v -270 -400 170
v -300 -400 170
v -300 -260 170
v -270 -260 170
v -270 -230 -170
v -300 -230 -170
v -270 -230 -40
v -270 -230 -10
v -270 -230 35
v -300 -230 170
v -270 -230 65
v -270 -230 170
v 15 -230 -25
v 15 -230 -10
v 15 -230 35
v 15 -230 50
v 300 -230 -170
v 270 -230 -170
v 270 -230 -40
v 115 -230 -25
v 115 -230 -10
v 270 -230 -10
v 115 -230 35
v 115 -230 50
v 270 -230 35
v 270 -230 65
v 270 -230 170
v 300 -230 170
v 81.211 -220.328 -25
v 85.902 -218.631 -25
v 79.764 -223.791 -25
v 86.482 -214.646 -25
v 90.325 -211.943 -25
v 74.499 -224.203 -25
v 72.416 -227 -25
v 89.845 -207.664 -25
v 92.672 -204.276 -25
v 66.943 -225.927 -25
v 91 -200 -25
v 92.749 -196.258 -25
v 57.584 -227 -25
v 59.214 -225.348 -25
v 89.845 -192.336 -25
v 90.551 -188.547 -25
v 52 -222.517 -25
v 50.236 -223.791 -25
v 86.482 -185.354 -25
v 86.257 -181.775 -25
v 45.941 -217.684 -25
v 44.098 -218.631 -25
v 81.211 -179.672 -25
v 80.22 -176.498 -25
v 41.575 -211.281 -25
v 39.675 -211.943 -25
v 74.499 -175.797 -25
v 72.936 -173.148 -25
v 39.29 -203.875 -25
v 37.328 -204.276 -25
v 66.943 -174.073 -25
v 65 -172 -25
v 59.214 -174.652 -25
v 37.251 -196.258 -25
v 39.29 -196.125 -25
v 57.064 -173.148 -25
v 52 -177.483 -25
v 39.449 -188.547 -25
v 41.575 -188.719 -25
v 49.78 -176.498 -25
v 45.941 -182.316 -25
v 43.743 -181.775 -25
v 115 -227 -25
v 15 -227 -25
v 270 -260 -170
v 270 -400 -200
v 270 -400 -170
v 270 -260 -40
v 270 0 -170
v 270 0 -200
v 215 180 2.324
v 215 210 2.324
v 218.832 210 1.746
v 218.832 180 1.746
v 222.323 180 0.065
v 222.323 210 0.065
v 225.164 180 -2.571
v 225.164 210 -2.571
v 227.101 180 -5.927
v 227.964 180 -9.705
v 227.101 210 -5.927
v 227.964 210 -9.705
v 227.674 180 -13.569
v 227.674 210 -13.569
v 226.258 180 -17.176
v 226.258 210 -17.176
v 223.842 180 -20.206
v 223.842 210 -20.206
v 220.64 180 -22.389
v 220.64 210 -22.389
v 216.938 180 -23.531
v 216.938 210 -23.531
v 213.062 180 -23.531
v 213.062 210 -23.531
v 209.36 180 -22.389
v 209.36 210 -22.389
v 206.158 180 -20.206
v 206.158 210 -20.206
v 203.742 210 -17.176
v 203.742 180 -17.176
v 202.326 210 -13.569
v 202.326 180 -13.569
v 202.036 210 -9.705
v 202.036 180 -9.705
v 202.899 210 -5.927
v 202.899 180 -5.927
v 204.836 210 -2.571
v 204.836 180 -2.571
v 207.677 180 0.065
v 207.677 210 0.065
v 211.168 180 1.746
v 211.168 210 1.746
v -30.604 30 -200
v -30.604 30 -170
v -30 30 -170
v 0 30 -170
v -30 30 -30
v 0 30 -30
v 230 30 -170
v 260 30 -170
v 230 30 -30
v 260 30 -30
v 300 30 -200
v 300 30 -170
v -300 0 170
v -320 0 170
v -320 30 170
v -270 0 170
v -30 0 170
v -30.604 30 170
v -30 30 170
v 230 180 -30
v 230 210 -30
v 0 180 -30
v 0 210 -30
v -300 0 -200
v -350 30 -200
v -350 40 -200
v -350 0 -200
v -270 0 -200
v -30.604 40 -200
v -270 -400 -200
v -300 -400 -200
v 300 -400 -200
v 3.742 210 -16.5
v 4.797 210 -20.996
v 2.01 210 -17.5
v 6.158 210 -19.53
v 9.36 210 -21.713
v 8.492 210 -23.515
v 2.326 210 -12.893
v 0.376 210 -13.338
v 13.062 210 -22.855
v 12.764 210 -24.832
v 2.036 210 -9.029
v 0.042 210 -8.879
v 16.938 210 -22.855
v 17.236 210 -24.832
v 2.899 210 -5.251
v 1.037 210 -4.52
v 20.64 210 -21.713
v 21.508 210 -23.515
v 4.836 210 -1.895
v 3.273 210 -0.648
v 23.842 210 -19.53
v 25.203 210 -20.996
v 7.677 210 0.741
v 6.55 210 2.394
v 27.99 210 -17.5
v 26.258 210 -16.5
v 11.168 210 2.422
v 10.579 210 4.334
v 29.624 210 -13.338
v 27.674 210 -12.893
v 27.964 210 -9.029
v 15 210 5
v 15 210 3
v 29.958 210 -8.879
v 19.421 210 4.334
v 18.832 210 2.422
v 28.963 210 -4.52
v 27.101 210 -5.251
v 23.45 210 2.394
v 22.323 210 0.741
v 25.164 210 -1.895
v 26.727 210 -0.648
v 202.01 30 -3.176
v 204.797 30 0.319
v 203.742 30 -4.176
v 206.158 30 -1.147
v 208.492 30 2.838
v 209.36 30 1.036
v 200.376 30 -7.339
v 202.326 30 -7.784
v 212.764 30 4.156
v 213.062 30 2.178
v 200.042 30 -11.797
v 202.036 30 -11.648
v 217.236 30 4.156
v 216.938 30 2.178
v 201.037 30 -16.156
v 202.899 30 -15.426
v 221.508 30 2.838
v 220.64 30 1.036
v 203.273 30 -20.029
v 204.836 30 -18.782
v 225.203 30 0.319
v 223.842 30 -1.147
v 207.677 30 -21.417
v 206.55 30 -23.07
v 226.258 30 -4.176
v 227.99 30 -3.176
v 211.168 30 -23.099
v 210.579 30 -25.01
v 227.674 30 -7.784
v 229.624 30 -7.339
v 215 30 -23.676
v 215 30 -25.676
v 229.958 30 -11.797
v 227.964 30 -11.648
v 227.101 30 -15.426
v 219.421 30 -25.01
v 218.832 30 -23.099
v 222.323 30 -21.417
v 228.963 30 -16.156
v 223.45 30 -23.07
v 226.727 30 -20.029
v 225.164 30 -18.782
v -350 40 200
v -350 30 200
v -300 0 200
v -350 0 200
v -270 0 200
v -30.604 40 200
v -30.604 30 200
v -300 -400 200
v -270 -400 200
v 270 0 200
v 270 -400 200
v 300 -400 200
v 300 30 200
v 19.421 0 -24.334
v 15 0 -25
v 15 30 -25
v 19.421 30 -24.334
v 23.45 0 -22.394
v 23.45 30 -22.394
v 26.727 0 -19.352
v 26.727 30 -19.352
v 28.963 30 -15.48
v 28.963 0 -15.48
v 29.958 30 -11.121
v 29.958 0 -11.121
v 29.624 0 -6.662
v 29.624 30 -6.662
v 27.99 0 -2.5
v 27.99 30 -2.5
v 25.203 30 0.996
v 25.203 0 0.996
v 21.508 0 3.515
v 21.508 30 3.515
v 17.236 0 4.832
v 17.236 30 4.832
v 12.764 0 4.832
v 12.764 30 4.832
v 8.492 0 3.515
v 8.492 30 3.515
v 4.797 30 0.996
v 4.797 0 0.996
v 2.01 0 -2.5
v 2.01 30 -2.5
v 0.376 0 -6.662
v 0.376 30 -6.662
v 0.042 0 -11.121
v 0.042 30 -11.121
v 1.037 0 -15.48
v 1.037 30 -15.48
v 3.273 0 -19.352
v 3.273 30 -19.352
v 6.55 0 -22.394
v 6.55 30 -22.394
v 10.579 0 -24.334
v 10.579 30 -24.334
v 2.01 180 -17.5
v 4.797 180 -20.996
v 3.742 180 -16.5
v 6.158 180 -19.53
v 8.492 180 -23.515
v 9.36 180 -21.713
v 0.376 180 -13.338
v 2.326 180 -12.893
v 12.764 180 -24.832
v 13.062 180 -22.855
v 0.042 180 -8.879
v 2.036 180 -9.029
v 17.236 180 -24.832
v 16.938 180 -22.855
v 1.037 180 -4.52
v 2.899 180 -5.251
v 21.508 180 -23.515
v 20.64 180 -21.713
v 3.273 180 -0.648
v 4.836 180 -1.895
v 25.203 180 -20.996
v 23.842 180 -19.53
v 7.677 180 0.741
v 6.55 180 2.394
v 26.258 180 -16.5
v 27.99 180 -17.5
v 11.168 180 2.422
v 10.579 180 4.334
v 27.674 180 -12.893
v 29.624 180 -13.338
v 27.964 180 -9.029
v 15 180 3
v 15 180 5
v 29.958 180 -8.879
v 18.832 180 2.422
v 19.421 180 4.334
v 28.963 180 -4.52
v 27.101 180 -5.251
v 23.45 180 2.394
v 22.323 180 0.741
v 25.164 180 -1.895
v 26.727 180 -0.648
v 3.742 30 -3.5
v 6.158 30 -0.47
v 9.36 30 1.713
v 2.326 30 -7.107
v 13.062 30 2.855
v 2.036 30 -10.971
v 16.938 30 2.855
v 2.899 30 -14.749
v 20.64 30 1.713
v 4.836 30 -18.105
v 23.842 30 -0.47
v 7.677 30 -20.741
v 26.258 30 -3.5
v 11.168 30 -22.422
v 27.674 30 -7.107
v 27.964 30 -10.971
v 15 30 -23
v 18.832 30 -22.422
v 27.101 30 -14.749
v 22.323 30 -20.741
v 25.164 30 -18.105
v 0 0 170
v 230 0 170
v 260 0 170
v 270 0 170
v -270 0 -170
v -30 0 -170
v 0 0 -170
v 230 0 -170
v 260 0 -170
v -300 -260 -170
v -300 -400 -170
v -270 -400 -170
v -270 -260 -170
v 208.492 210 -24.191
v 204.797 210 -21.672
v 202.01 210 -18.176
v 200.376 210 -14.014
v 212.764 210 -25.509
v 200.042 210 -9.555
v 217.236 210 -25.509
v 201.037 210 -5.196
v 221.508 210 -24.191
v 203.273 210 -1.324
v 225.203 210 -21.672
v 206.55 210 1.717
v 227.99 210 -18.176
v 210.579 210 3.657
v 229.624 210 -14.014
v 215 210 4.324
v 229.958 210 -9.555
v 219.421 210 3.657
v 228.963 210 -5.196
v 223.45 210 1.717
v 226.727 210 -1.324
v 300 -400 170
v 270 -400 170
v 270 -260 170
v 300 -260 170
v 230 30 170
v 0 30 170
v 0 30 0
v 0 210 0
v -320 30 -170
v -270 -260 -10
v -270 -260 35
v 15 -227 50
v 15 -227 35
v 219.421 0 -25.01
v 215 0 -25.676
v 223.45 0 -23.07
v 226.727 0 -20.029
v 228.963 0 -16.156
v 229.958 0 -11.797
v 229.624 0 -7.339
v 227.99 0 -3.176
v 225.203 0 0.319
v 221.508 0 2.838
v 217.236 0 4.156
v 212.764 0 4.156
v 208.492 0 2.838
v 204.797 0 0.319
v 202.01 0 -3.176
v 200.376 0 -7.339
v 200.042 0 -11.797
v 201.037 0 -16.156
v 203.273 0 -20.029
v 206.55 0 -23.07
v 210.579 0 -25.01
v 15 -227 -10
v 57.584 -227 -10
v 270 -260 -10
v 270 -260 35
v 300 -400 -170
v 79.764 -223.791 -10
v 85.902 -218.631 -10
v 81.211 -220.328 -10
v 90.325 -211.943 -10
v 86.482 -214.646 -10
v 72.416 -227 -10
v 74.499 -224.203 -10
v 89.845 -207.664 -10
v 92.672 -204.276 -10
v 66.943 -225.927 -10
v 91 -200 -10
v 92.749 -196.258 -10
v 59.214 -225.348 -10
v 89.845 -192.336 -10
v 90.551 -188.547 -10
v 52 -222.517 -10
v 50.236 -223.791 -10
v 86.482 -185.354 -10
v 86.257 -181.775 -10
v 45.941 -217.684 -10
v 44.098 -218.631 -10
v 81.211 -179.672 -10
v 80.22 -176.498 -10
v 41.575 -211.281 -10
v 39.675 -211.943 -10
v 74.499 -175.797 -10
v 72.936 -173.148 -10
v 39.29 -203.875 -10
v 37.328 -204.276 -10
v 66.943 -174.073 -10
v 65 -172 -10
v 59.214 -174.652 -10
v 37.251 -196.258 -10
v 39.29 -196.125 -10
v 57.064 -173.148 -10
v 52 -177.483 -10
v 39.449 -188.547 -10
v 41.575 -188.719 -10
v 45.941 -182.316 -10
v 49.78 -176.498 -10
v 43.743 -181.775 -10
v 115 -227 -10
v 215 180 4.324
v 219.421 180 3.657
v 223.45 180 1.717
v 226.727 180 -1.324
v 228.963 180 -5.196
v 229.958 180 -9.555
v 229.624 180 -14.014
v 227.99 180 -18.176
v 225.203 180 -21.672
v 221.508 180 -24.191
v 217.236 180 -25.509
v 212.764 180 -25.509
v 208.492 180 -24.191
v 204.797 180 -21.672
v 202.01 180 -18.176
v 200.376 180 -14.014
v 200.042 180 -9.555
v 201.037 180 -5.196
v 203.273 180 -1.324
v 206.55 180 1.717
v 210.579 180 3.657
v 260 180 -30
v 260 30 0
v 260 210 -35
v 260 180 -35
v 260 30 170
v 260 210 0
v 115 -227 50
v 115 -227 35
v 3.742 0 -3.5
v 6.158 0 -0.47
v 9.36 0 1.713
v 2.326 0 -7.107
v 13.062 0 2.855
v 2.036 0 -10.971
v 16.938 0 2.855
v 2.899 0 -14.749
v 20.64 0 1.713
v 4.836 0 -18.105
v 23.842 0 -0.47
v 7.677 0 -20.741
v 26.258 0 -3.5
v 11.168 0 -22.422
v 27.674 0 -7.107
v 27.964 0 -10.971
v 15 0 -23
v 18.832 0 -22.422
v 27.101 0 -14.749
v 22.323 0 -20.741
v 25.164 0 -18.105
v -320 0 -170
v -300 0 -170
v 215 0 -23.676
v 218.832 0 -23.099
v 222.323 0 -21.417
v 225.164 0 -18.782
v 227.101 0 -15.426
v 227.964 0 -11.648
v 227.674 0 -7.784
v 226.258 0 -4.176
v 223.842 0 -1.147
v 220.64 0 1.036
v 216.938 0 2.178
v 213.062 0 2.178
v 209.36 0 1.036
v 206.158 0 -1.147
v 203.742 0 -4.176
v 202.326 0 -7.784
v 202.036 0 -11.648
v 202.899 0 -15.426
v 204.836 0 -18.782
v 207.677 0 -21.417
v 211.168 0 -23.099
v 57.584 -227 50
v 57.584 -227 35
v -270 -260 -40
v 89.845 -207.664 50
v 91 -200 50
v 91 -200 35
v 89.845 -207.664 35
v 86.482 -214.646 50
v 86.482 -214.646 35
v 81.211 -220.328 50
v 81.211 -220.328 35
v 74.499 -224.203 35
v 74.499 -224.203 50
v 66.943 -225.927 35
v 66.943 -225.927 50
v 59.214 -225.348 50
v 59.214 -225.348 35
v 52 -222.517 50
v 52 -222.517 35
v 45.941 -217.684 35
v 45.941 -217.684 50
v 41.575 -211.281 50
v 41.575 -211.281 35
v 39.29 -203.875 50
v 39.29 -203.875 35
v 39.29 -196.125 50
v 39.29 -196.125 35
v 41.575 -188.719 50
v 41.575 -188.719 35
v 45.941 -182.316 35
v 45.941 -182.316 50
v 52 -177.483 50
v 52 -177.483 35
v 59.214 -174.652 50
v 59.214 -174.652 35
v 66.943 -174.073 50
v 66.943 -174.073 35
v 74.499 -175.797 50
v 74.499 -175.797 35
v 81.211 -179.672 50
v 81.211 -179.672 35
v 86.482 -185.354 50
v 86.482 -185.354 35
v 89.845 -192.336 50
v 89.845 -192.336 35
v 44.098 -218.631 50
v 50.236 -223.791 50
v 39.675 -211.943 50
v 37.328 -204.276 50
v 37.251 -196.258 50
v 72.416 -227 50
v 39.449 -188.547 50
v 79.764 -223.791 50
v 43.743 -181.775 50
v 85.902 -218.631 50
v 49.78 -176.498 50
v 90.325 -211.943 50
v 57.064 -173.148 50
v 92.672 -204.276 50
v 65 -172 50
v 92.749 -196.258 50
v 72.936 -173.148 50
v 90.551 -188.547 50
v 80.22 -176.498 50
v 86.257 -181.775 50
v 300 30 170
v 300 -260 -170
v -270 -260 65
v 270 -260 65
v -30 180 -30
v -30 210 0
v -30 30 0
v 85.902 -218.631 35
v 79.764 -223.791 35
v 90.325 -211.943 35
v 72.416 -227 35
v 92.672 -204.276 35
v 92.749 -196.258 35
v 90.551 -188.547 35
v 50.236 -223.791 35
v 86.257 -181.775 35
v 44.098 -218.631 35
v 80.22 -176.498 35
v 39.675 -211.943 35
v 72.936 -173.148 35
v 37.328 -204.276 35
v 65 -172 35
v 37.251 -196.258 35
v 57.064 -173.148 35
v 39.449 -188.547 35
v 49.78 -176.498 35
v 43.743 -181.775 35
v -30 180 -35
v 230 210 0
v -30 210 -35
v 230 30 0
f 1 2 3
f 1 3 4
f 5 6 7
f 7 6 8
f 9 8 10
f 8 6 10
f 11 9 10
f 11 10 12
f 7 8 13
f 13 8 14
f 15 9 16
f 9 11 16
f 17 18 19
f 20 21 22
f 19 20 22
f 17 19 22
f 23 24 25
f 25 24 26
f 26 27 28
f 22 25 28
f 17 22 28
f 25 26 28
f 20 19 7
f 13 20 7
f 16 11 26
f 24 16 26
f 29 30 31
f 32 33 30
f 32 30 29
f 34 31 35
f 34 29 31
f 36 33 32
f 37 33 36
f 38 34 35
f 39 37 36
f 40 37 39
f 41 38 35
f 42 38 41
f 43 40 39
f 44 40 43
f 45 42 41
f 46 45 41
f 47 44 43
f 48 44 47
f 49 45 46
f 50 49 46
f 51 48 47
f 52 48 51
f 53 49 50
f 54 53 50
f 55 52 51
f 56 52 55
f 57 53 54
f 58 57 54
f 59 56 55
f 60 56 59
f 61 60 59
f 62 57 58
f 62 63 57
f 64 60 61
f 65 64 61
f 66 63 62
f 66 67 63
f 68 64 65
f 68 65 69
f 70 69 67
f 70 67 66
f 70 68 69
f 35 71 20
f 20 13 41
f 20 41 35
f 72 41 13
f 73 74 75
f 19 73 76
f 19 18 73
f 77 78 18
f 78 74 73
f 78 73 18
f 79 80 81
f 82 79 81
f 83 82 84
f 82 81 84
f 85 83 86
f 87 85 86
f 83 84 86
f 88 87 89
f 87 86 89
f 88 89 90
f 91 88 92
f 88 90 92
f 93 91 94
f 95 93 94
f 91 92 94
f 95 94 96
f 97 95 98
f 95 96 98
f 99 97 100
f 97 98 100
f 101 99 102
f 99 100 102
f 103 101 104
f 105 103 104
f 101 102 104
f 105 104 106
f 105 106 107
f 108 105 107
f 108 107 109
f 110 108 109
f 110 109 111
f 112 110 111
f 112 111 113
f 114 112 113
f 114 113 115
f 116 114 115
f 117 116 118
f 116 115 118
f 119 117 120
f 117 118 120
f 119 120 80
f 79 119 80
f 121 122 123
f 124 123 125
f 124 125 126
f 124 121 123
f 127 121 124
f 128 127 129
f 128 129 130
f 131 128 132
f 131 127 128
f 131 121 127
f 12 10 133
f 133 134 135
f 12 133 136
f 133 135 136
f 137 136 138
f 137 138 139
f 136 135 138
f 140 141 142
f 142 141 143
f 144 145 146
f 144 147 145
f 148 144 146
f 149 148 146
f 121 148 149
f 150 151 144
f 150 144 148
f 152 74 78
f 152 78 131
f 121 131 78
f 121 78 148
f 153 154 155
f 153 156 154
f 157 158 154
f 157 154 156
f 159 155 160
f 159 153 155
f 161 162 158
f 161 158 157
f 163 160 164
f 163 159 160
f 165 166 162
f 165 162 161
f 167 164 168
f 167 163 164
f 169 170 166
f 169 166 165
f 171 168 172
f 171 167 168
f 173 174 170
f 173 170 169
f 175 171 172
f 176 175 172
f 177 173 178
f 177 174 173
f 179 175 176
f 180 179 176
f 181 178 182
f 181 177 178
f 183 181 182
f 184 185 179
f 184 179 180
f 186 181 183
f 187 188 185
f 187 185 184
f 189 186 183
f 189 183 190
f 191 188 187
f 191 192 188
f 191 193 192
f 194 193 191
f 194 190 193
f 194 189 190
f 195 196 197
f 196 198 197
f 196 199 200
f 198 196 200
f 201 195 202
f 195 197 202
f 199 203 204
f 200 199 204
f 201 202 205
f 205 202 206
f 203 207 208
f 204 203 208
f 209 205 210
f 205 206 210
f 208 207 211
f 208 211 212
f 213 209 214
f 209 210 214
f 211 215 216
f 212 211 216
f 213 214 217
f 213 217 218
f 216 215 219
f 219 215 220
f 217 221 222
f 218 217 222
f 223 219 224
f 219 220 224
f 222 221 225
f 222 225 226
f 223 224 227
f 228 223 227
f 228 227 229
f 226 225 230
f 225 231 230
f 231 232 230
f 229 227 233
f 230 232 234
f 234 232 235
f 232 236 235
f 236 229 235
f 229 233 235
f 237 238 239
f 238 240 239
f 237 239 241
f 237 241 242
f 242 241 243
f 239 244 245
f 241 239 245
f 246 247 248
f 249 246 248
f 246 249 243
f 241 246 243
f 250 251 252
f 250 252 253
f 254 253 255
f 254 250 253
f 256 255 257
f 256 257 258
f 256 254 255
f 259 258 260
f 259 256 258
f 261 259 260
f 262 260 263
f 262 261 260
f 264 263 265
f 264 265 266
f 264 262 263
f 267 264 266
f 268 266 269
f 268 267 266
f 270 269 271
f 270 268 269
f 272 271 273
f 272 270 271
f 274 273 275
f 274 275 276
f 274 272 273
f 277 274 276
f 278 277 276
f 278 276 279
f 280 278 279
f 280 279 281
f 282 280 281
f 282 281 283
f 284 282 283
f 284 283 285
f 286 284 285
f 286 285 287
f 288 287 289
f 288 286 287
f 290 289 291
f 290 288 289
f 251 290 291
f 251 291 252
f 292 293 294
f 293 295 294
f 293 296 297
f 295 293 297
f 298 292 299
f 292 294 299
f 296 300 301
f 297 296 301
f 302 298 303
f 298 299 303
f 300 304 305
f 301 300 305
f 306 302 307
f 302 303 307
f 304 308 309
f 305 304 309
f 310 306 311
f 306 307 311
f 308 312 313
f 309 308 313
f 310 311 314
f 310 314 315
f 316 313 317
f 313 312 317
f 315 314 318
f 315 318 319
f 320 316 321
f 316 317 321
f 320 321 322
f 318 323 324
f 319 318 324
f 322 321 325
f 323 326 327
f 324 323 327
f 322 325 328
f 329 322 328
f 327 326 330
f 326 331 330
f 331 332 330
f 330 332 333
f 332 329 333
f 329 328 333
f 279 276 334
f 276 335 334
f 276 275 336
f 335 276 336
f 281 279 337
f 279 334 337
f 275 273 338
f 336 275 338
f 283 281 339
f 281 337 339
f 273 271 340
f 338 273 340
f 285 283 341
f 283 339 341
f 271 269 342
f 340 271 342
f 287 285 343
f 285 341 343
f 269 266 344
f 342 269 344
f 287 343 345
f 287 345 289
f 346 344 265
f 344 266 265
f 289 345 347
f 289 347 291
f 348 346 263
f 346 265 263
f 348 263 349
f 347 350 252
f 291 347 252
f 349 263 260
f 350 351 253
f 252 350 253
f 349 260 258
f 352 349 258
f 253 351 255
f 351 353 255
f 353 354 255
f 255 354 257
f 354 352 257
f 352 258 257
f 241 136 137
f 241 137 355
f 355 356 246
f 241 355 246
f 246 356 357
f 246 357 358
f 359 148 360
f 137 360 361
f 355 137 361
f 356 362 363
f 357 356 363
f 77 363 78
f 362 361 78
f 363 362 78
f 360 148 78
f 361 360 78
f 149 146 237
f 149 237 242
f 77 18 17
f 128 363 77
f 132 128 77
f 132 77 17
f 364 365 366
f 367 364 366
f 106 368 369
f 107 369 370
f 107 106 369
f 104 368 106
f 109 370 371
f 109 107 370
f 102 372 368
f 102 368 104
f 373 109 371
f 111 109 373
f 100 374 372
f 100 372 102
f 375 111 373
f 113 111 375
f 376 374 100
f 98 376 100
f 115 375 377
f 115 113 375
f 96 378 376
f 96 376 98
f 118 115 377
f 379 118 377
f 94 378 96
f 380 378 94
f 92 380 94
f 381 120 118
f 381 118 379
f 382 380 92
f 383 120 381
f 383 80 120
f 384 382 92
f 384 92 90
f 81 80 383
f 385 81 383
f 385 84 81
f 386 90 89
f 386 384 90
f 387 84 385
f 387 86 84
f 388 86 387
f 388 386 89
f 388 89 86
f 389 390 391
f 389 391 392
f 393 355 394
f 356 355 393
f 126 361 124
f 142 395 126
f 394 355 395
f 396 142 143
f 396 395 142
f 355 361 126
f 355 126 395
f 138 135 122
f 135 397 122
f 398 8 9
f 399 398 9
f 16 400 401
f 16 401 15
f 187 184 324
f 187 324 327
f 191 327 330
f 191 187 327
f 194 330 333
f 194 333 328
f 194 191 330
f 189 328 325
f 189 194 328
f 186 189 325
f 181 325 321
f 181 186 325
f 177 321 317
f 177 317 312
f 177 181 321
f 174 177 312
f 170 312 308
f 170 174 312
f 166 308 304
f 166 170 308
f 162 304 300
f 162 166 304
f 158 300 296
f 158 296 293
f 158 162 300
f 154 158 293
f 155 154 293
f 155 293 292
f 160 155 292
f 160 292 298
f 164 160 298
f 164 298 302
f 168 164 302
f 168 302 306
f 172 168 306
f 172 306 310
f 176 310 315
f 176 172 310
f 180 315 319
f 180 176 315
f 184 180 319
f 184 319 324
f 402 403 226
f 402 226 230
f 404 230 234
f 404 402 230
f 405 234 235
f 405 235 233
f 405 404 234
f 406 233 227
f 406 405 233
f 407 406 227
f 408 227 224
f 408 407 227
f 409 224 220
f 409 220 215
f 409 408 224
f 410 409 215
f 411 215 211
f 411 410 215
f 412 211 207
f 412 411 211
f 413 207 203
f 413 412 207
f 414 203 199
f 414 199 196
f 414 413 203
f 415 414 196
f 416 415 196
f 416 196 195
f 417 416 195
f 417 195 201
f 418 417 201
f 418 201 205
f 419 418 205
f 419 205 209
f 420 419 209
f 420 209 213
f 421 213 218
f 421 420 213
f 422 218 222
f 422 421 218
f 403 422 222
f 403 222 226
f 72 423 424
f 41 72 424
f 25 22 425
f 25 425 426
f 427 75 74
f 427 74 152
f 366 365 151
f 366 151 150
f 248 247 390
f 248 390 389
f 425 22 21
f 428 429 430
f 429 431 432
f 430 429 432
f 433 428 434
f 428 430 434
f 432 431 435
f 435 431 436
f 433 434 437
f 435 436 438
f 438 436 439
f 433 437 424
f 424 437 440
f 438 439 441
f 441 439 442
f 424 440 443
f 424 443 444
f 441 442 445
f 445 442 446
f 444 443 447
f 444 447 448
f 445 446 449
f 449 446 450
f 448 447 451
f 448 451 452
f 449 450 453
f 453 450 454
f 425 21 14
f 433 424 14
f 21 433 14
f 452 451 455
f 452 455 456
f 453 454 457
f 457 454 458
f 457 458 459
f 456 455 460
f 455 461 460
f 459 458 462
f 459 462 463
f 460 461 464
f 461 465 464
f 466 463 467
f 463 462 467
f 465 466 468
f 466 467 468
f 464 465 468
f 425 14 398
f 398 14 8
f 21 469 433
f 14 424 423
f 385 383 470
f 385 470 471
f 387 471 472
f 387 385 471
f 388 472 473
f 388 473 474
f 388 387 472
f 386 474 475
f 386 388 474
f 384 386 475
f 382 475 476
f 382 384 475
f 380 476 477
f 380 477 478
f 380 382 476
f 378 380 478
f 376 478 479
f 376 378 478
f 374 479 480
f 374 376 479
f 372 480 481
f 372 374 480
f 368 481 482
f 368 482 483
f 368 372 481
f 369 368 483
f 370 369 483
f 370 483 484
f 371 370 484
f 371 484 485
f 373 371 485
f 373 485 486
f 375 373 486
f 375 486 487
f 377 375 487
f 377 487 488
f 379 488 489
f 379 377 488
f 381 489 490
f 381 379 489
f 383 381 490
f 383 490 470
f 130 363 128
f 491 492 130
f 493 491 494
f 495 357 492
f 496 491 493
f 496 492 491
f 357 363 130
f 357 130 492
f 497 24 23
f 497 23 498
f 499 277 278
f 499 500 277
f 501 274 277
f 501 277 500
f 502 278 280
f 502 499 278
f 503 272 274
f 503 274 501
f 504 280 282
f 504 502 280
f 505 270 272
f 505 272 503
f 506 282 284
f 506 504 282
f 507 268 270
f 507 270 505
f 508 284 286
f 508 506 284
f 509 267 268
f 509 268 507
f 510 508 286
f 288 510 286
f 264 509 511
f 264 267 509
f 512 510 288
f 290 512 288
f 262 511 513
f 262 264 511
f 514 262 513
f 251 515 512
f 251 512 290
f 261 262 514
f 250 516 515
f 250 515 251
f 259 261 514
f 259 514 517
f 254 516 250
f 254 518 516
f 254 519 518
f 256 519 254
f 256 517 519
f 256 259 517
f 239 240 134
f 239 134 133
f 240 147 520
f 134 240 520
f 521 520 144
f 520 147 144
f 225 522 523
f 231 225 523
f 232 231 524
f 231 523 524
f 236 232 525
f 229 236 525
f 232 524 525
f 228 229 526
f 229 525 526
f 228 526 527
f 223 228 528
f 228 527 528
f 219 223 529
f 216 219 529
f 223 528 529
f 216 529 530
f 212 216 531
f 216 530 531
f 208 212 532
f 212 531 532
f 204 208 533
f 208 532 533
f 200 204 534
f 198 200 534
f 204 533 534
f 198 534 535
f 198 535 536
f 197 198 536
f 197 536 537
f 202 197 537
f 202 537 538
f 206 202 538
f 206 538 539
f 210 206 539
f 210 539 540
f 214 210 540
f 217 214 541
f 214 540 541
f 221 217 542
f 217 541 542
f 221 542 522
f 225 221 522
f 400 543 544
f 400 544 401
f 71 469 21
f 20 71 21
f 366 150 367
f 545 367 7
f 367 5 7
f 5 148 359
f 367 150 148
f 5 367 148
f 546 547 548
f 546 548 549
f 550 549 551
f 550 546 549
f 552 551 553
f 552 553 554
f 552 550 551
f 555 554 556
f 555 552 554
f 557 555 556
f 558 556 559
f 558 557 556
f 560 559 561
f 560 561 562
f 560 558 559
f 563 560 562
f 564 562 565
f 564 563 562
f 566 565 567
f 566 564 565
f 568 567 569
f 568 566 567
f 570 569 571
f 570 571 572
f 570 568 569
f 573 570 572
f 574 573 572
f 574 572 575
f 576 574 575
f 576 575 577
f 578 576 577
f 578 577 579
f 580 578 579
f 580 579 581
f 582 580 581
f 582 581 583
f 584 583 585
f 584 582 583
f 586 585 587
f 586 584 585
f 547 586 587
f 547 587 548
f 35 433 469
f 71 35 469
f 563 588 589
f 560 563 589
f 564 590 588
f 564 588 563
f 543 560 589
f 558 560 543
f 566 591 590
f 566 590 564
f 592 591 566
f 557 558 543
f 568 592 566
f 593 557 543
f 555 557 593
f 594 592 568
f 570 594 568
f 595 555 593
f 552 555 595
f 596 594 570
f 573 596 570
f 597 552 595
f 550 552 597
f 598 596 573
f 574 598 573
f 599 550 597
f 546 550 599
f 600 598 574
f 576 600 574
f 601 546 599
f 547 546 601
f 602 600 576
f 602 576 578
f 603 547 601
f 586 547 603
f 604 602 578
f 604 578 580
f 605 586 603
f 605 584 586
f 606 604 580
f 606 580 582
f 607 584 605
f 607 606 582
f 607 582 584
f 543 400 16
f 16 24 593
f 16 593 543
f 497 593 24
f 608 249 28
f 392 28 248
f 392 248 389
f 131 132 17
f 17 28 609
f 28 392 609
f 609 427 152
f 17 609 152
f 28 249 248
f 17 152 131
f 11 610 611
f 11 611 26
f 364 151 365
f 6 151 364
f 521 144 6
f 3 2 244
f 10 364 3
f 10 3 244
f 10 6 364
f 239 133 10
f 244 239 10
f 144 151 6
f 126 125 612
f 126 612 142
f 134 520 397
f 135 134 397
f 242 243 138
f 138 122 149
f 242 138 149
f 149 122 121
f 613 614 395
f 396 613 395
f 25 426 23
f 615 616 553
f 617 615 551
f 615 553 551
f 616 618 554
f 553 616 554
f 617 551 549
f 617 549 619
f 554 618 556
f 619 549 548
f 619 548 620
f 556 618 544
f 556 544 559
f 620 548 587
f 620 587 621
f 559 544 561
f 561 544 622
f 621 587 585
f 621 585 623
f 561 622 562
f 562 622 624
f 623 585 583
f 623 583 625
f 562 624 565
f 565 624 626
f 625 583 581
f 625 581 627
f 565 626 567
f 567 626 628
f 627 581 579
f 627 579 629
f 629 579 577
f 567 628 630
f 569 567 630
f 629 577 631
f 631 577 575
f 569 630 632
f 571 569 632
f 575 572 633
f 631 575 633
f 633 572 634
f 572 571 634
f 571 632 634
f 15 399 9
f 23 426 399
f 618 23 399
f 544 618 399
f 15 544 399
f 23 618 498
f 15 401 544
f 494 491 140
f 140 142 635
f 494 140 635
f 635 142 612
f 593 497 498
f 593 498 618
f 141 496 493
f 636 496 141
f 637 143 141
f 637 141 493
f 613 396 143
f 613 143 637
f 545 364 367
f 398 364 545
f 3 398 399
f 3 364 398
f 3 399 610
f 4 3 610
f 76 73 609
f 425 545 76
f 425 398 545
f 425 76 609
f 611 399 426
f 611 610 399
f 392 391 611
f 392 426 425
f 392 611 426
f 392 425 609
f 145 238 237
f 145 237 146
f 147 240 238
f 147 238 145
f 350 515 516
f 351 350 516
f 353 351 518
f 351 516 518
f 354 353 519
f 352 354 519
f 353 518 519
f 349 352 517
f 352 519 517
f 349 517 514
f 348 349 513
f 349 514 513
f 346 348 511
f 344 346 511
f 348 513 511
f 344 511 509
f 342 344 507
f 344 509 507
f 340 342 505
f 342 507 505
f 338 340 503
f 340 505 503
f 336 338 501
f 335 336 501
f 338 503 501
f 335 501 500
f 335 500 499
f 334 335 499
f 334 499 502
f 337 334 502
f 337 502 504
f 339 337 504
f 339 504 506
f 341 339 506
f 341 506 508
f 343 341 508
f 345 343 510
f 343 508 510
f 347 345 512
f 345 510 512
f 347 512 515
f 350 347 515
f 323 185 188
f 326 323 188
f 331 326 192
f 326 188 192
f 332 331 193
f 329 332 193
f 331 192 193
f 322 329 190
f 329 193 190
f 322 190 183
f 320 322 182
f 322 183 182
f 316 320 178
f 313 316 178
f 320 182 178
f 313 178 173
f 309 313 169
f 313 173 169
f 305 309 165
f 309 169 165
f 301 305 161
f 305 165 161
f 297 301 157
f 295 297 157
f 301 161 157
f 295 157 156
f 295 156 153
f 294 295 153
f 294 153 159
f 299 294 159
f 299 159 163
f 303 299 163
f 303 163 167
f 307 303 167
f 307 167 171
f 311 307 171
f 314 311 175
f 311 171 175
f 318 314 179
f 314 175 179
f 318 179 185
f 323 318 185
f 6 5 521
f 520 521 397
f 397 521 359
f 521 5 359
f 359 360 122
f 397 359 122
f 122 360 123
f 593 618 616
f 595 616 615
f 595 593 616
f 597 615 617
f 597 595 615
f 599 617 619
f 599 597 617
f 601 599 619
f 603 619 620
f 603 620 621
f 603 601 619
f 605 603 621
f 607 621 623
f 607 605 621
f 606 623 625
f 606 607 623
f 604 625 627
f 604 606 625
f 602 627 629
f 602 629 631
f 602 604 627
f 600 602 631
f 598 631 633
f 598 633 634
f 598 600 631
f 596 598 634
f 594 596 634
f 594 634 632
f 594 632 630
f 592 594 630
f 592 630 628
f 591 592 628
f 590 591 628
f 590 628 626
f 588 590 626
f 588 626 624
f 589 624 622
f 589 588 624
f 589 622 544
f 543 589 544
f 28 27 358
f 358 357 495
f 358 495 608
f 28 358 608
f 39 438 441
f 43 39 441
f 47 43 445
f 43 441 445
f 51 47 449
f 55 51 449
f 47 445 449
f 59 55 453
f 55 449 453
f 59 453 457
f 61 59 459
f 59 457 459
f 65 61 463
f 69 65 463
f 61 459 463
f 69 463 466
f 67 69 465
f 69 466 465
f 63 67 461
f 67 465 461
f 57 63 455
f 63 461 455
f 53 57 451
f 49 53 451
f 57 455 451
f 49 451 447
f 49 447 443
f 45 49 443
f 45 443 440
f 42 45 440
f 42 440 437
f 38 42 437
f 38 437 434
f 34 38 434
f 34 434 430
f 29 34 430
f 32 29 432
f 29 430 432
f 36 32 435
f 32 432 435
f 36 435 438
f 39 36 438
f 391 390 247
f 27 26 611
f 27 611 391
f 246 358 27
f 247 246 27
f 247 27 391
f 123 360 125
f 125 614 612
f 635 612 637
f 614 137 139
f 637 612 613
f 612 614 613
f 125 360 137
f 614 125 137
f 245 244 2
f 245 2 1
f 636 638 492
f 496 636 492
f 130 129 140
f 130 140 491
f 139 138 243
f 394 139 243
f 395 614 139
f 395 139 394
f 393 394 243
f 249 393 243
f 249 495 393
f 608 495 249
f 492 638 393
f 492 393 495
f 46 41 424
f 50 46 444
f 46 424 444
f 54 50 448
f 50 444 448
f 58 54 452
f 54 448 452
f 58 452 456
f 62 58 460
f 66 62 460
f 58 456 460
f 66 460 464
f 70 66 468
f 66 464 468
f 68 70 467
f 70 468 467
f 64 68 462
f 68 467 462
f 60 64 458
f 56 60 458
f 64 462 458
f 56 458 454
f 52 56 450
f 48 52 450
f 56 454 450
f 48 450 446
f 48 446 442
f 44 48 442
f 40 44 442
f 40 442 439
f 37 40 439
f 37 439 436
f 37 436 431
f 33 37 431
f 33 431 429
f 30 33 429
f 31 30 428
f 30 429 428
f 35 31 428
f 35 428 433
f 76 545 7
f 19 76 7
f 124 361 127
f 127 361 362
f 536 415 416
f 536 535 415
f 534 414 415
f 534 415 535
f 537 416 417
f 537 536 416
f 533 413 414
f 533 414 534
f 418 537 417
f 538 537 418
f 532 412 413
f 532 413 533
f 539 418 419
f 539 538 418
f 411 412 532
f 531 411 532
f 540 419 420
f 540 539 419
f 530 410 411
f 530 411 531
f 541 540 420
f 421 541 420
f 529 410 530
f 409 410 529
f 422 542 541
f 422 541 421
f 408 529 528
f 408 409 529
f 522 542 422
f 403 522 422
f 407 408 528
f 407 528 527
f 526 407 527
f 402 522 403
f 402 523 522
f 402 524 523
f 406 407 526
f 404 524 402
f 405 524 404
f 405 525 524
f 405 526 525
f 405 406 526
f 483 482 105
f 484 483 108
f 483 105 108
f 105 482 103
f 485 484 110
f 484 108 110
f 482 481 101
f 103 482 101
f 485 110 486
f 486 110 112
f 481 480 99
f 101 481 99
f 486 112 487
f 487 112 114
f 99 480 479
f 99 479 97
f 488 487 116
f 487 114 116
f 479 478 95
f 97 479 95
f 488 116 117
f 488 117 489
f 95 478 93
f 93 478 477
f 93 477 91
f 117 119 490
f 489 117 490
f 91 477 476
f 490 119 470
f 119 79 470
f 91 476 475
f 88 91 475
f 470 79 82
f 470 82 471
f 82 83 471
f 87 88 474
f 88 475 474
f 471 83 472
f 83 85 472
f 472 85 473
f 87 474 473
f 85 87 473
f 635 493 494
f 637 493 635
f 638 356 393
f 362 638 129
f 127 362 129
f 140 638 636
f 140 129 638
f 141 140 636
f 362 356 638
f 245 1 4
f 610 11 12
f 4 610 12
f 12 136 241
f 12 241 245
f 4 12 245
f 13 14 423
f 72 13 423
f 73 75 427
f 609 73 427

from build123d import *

# Parameters (mm, degrees)
SKETCH4_W              = 600
SKETCH4_H              = 400
SKETCH4_W_2            = 540
SKETCH4_H_2            = 340
BOSS_EXTRUDE2_DEPTH    = 30
SKETCH10_W             = 30
SKETCH10_H             = 30
BOSS_EXTRUDE7_DEPTH    = 370
SKETCH17_W             = 30
SKETCH17_H             = 30
BOSS_EXTRUDE13_DEPTH   = 500
SKETCH18_W             = 30
SKETCH18_H             = 30
BOSS_EXTRUDE14_DEPTH   = 370
SKETCH19_W             = 30
SKETCH19_H             = 30
BOSS_EXTRUDE15_DEPTH   = 570
SKETCH21_R             = 26
BOSS_EXTRUDE17_DEPTH   = 15
BOSS_EXTRUDE18_START   = -15
SKETCH22_R             = 26
BOSS_EXTRUDE18_DEPTH   = 15
SKETCH23_W             = 30
SKETCH23_H             = 30
CUT_EXTRUDE2_DEPTH     = 100
SKETCH27_W             = 30
SKETCH27_H             = 30
BOSS_EXTRUDE22_DEPTH   = 340
SKETCH28_W             = 30
SKETCH28_H             = 30
BOSS_EXTRUDE23_DEPTH   = 180
SKETCH31_R             = 15
SKETCH31_R_2           = 13
BOSS_EXTRUDE24_DEPTH   = 30
BOSS_EXTRUDE24_2_DEPTH = 30
SKETCH34_R             = 15
SKETCH34_R_2           = 13
BOSS_EXTRUDE25_DEPTH   = 30
BOSS_EXTRUDE25_2_DEPTH = 30
SKETCH35_W             = 30
SKETCH35_H             = 30
CUT_EXTRUDE3_DEPTH     = 340
SKETCH36_W             = 30
SKETCH36_H             = 30
CUT_EXTRUDE4_DEPTH     = 340
SKETCH37_W             = 30
SKETCH37_H             = 30
BOSS_EXTRUDE26_DEPTH   = 50
SKETCH38_W             = 30
SKETCH38_H             = 30
BOSS_EXTRUDE27_DEPTH   = 340
SKETCH39_W             = 319.396071149
SKETCH39_H             = 400
BOSS_EXTRUDE28_DEPTH   = 10
SKETCH42_W             = 290
SKETCH42_H             = 30
BOSS_EXTRUDE31_DEPTH   = 5


with BuildPart() as part:
    # Sketch4 → Boss-Extrude2 (new body)
    with BuildSketch(Plane(origin=(0, 0, 0), x_dir=(1, 0, 0), z_dir=(0, 1, 0))):
        Rectangle(SKETCH4_W, SKETCH4_H)
        Rectangle(SKETCH4_W_2, SKETCH4_H_2, mode=Mode.SUBTRACT)
    extrude(amount=BOSS_EXTRUDE2_DEPTH)

    # Sketch10 → Boss-Extrude7 (add)
    with BuildSketch(Plane.XY.offset(200)):
        with Locations((-15, 15)):
            Rectangle(SKETCH10_W, SKETCH10_H)
    extrude(amount=-BOSS_EXTRUDE7_DEPTH)

    # Sketch17 → Boss-Extrude13 (add)
    with BuildSketch(Plane.XZ):
        with Locations((-285, 185)):
            Rectangle(SKETCH17_W, SKETCH17_H)
        with Locations((285, 185)):
            Rectangle(SKETCH17_W, SKETCH17_H)
        with Locations((285, -185)):
            Rectangle(SKETCH17_W, SKETCH17_H)
        with Locations((-285, -185)):
            Rectangle(SKETCH17_W, SKETCH17_H)
    extrude(amount=BOSS_EXTRUDE13_DEPTH)

    # Sketch18 → Boss-Extrude14 (add)
    with BuildSketch(Plane.XY.offset(200)):
        with Locations((285, -245)):
            Rectangle(SKETCH18_W, SKETCH18_H)
        with Locations((-285, -245)):
            Rectangle(SKETCH18_W, SKETCH18_H)
    extrude(amount=-BOSS_EXTRUDE14_DEPTH)

    # Sketch19 → Boss-Extrude15 (add)
    with BuildSketch(Plane.ZY.offset(300)):
        with Locations((-25, -245)):
            Rectangle(SKETCH19_W, SKETCH19_H)
        with Locations((50, -245)):
            Rectangle(SKETCH19_W, SKETCH19_H)
    extrude(amount=-BOSS_EXTRUDE15_DEPTH)

    # Sketch21 → Boss-Extrude17 (add)
    with BuildSketch(Plane.XY.offset(-10)):
        with BuildLine():
            Line((72.416198487, -227), (115, -227))
            Line((115, -227), (115, -233))
            Line((115, -233), (15, -233))
            Line((15, -233), (15, -227))
            Line((15, -227), (57.583801513, -227))
            ThreePointArc((57.583801513, -227), (65, -172), (72.416198487, -227))
        make_face()
        with Locations((65, -200)):
            Circle(SKETCH21_R, mode=Mode.SUBTRACT)
    extrude(amount=-BOSS_EXTRUDE17_DEPTH)

    # Sketch22 → Boss-Extrude18 (add)
    with BuildSketch(Plane(origin=(0, 0, 35), x_dir=(-1, 0, 0), z_dir=(0, 0, -1)).offset(BOSS_EXTRUDE18_START)):
        with BuildLine():
            Line((-57.583801513, -227), (-15, -227))
            Line((-15, -227), (-15, -230))
            Line((-15, -230), (-115, -230))
            Line((-115, -230), (-115, -227))
            Line((-115, -227), (-72.416198487, -227))
            ThreePointArc((-72.416198487, -227), (-65, -172), (-57.583801513, -227))
        make_face()
        with Locations(Location((-65, -200, 0), (0, 0, 180))):
            Circle(SKETCH22_R, mode=Mode.SUBTRACT)
    extrude(amount=BOSS_EXTRUDE18_DEPTH)

    # Sketch23 → Cut-Extrude2 (cut)
    with BuildSketch(Plane.XZ.offset(500)):
        with Locations((-285, 185)):
            Rectangle(SKETCH23_W, SKETCH23_H)
        with Locations((285, 185)):
            Rectangle(SKETCH23_W, SKETCH23_H)
        with Locations((285, -185)):
            Rectangle(SKETCH23_W, SKETCH23_H)
        with Locations((-285, -185)):
            Rectangle(SKETCH23_W, SKETCH23_H)
    extrude(amount=-CUT_EXTRUDE2_DEPTH, mode=Mode.SUBTRACT)

    # Sketch27 → Boss-Extrude22 (add)
    with BuildSketch(Plane.XY.offset(-170)):
        with Locations((245, 15)):
            Rectangle(SKETCH27_W, SKETCH27_H)
    extrude(amount=BOSS_EXTRUDE22_DEPTH)

    # Sketch28 → Boss-Extrude23 (add)
    with BuildSketch(Plane(origin=(0, 30, 0), x_dir=(1, 0, 0), z_dir=(0, 1, 0))):
        with Locations((-15, 15)):
            Rectangle(SKETCH28_W, SKETCH28_H)
        with Locations((245, 15)):
            Rectangle(SKETCH28_W, SKETCH28_H)
    extrude(amount=BOSS_EXTRUDE23_DEPTH)

    # Sketch35 → Cut-Extrude3 (cut)
    with BuildSketch(Plane.XY.offset(-170)):
        with Locations((285, 15)):
            Rectangle(SKETCH35_W, SKETCH35_H)
    extrude(amount=CUT_EXTRUDE3_DEPTH, mode=Mode.SUBTRACT)

    # Sketch36 → Cut-Extrude4 (cut)
    with BuildSketch(Plane.XY.offset(-170)):
        with Locations((-285, 15)):
            Rectangle(SKETCH36_W, SKETCH36_H)
    extrude(amount=CUT_EXTRUDE4_DEPTH, mode=Mode.SUBTRACT)

    # Sketch37 → Boss-Extrude26 (add)
    with BuildSketch(Plane.ZY.offset(300)):
        with Locations((-185, 15)):
            Rectangle(SKETCH37_W, SKETCH37_H)
        with Locations((185, 15)):
            Rectangle(SKETCH37_W, SKETCH37_H)
    extrude(amount=BOSS_EXTRUDE26_DEPTH)

    # Sketch38 → Boss-Extrude27 (add)
    with BuildSketch(Plane.XY.offset(-170)):
        with Locations((-335, 15)):
            Rectangle(SKETCH38_W, SKETCH38_H)
    extrude(amount=BOSS_EXTRUDE27_DEPTH)

    # Sketch39 → Boss-Extrude28 (add)
    with BuildSketch(Plane(origin=(0, 30, 0), x_dir=(1, 0, 0), z_dir=(0, 1, 0))):
        with Locations((-190.301964425, 0)):
            Rectangle(SKETCH39_W, SKETCH39_H)
    extrude(amount=BOSS_EXTRUDE28_DEPTH)

    # Sketch42 → Boss-Extrude31 (add)
    with BuildSketch(Plane(origin=(0, 0, -30), x_dir=(-1, 0, 0), z_dir=(0, 0, -1))):
        with Locations((-115, 195)):
            Rectangle(SKETCH42_W, SKETCH42_H)
    extrude(amount=BOSS_EXTRUDE31_DEPTH)


with BuildPart() as body_2:
    # Sketch31 → Boss-Extrude24 (new body)
    with BuildSketch(Plane.XZ):
        with Locations(Location((15, -10, 0), (0, 0, 270))):
            Circle(SKETCH31_R)
        with Locations(Location((15, -10, 0), (0, 0, 270))):
            Circle(SKETCH31_R_2, mode=Mode.SUBTRACT)
    extrude(amount=-BOSS_EXTRUDE24_DEPTH)


with BuildPart() as body_3:
    # Sketch31 → Boss-Extrude24 2 (new body)
    with BuildSketch(Plane.XZ):
        with Locations(Location((215, -10.676344756, 0), (0, 0, 270))):
            Circle(SKETCH31_R)
        with Locations(Location((215, -10.676344756, 0), (0, 0, 270))):
            Circle(SKETCH31_R_2, mode=Mode.SUBTRACT)
    extrude(amount=-BOSS_EXTRUDE24_2_DEPTH)


with BuildPart() as body_4:
    # Sketch34 → Boss-Extrude25 (new body)
    with BuildSketch(Plane(origin=(0, 210, 0), x_dir=(1, 0, 0), z_dir=(0, 1, 0))):
        with Locations(Location((15, 10, 0), (0, 0, 270))):
            Circle(SKETCH34_R)
        with Locations(Location((15, 10, 0), (0, 0, 270))):
            Circle(SKETCH34_R_2, mode=Mode.SUBTRACT)
    extrude(amount=-BOSS_EXTRUDE25_DEPTH)


with BuildPart() as body_5:
    # Sketch34 → Boss-Extrude25 2 (new body)
    with BuildSketch(Plane(origin=(0, 210, 0), x_dir=(1, 0, 0), z_dir=(0, 1, 0))):
        with Locations(Location((215, 10.676344756, 0), (0, 0, 270))):
            Circle(SKETCH34_R)
        with Locations(Location((215, 10.676344756, 0), (0, 0, 270))):
            Circle(SKETCH34_R_2, mode=Mode.SUBTRACT)
    extrude(amount=-BOSS_EXTRUDE25_2_DEPTH)


solid = Compound([part.part, body_2.part, body_3.part, body_4.part, body_5.part])
